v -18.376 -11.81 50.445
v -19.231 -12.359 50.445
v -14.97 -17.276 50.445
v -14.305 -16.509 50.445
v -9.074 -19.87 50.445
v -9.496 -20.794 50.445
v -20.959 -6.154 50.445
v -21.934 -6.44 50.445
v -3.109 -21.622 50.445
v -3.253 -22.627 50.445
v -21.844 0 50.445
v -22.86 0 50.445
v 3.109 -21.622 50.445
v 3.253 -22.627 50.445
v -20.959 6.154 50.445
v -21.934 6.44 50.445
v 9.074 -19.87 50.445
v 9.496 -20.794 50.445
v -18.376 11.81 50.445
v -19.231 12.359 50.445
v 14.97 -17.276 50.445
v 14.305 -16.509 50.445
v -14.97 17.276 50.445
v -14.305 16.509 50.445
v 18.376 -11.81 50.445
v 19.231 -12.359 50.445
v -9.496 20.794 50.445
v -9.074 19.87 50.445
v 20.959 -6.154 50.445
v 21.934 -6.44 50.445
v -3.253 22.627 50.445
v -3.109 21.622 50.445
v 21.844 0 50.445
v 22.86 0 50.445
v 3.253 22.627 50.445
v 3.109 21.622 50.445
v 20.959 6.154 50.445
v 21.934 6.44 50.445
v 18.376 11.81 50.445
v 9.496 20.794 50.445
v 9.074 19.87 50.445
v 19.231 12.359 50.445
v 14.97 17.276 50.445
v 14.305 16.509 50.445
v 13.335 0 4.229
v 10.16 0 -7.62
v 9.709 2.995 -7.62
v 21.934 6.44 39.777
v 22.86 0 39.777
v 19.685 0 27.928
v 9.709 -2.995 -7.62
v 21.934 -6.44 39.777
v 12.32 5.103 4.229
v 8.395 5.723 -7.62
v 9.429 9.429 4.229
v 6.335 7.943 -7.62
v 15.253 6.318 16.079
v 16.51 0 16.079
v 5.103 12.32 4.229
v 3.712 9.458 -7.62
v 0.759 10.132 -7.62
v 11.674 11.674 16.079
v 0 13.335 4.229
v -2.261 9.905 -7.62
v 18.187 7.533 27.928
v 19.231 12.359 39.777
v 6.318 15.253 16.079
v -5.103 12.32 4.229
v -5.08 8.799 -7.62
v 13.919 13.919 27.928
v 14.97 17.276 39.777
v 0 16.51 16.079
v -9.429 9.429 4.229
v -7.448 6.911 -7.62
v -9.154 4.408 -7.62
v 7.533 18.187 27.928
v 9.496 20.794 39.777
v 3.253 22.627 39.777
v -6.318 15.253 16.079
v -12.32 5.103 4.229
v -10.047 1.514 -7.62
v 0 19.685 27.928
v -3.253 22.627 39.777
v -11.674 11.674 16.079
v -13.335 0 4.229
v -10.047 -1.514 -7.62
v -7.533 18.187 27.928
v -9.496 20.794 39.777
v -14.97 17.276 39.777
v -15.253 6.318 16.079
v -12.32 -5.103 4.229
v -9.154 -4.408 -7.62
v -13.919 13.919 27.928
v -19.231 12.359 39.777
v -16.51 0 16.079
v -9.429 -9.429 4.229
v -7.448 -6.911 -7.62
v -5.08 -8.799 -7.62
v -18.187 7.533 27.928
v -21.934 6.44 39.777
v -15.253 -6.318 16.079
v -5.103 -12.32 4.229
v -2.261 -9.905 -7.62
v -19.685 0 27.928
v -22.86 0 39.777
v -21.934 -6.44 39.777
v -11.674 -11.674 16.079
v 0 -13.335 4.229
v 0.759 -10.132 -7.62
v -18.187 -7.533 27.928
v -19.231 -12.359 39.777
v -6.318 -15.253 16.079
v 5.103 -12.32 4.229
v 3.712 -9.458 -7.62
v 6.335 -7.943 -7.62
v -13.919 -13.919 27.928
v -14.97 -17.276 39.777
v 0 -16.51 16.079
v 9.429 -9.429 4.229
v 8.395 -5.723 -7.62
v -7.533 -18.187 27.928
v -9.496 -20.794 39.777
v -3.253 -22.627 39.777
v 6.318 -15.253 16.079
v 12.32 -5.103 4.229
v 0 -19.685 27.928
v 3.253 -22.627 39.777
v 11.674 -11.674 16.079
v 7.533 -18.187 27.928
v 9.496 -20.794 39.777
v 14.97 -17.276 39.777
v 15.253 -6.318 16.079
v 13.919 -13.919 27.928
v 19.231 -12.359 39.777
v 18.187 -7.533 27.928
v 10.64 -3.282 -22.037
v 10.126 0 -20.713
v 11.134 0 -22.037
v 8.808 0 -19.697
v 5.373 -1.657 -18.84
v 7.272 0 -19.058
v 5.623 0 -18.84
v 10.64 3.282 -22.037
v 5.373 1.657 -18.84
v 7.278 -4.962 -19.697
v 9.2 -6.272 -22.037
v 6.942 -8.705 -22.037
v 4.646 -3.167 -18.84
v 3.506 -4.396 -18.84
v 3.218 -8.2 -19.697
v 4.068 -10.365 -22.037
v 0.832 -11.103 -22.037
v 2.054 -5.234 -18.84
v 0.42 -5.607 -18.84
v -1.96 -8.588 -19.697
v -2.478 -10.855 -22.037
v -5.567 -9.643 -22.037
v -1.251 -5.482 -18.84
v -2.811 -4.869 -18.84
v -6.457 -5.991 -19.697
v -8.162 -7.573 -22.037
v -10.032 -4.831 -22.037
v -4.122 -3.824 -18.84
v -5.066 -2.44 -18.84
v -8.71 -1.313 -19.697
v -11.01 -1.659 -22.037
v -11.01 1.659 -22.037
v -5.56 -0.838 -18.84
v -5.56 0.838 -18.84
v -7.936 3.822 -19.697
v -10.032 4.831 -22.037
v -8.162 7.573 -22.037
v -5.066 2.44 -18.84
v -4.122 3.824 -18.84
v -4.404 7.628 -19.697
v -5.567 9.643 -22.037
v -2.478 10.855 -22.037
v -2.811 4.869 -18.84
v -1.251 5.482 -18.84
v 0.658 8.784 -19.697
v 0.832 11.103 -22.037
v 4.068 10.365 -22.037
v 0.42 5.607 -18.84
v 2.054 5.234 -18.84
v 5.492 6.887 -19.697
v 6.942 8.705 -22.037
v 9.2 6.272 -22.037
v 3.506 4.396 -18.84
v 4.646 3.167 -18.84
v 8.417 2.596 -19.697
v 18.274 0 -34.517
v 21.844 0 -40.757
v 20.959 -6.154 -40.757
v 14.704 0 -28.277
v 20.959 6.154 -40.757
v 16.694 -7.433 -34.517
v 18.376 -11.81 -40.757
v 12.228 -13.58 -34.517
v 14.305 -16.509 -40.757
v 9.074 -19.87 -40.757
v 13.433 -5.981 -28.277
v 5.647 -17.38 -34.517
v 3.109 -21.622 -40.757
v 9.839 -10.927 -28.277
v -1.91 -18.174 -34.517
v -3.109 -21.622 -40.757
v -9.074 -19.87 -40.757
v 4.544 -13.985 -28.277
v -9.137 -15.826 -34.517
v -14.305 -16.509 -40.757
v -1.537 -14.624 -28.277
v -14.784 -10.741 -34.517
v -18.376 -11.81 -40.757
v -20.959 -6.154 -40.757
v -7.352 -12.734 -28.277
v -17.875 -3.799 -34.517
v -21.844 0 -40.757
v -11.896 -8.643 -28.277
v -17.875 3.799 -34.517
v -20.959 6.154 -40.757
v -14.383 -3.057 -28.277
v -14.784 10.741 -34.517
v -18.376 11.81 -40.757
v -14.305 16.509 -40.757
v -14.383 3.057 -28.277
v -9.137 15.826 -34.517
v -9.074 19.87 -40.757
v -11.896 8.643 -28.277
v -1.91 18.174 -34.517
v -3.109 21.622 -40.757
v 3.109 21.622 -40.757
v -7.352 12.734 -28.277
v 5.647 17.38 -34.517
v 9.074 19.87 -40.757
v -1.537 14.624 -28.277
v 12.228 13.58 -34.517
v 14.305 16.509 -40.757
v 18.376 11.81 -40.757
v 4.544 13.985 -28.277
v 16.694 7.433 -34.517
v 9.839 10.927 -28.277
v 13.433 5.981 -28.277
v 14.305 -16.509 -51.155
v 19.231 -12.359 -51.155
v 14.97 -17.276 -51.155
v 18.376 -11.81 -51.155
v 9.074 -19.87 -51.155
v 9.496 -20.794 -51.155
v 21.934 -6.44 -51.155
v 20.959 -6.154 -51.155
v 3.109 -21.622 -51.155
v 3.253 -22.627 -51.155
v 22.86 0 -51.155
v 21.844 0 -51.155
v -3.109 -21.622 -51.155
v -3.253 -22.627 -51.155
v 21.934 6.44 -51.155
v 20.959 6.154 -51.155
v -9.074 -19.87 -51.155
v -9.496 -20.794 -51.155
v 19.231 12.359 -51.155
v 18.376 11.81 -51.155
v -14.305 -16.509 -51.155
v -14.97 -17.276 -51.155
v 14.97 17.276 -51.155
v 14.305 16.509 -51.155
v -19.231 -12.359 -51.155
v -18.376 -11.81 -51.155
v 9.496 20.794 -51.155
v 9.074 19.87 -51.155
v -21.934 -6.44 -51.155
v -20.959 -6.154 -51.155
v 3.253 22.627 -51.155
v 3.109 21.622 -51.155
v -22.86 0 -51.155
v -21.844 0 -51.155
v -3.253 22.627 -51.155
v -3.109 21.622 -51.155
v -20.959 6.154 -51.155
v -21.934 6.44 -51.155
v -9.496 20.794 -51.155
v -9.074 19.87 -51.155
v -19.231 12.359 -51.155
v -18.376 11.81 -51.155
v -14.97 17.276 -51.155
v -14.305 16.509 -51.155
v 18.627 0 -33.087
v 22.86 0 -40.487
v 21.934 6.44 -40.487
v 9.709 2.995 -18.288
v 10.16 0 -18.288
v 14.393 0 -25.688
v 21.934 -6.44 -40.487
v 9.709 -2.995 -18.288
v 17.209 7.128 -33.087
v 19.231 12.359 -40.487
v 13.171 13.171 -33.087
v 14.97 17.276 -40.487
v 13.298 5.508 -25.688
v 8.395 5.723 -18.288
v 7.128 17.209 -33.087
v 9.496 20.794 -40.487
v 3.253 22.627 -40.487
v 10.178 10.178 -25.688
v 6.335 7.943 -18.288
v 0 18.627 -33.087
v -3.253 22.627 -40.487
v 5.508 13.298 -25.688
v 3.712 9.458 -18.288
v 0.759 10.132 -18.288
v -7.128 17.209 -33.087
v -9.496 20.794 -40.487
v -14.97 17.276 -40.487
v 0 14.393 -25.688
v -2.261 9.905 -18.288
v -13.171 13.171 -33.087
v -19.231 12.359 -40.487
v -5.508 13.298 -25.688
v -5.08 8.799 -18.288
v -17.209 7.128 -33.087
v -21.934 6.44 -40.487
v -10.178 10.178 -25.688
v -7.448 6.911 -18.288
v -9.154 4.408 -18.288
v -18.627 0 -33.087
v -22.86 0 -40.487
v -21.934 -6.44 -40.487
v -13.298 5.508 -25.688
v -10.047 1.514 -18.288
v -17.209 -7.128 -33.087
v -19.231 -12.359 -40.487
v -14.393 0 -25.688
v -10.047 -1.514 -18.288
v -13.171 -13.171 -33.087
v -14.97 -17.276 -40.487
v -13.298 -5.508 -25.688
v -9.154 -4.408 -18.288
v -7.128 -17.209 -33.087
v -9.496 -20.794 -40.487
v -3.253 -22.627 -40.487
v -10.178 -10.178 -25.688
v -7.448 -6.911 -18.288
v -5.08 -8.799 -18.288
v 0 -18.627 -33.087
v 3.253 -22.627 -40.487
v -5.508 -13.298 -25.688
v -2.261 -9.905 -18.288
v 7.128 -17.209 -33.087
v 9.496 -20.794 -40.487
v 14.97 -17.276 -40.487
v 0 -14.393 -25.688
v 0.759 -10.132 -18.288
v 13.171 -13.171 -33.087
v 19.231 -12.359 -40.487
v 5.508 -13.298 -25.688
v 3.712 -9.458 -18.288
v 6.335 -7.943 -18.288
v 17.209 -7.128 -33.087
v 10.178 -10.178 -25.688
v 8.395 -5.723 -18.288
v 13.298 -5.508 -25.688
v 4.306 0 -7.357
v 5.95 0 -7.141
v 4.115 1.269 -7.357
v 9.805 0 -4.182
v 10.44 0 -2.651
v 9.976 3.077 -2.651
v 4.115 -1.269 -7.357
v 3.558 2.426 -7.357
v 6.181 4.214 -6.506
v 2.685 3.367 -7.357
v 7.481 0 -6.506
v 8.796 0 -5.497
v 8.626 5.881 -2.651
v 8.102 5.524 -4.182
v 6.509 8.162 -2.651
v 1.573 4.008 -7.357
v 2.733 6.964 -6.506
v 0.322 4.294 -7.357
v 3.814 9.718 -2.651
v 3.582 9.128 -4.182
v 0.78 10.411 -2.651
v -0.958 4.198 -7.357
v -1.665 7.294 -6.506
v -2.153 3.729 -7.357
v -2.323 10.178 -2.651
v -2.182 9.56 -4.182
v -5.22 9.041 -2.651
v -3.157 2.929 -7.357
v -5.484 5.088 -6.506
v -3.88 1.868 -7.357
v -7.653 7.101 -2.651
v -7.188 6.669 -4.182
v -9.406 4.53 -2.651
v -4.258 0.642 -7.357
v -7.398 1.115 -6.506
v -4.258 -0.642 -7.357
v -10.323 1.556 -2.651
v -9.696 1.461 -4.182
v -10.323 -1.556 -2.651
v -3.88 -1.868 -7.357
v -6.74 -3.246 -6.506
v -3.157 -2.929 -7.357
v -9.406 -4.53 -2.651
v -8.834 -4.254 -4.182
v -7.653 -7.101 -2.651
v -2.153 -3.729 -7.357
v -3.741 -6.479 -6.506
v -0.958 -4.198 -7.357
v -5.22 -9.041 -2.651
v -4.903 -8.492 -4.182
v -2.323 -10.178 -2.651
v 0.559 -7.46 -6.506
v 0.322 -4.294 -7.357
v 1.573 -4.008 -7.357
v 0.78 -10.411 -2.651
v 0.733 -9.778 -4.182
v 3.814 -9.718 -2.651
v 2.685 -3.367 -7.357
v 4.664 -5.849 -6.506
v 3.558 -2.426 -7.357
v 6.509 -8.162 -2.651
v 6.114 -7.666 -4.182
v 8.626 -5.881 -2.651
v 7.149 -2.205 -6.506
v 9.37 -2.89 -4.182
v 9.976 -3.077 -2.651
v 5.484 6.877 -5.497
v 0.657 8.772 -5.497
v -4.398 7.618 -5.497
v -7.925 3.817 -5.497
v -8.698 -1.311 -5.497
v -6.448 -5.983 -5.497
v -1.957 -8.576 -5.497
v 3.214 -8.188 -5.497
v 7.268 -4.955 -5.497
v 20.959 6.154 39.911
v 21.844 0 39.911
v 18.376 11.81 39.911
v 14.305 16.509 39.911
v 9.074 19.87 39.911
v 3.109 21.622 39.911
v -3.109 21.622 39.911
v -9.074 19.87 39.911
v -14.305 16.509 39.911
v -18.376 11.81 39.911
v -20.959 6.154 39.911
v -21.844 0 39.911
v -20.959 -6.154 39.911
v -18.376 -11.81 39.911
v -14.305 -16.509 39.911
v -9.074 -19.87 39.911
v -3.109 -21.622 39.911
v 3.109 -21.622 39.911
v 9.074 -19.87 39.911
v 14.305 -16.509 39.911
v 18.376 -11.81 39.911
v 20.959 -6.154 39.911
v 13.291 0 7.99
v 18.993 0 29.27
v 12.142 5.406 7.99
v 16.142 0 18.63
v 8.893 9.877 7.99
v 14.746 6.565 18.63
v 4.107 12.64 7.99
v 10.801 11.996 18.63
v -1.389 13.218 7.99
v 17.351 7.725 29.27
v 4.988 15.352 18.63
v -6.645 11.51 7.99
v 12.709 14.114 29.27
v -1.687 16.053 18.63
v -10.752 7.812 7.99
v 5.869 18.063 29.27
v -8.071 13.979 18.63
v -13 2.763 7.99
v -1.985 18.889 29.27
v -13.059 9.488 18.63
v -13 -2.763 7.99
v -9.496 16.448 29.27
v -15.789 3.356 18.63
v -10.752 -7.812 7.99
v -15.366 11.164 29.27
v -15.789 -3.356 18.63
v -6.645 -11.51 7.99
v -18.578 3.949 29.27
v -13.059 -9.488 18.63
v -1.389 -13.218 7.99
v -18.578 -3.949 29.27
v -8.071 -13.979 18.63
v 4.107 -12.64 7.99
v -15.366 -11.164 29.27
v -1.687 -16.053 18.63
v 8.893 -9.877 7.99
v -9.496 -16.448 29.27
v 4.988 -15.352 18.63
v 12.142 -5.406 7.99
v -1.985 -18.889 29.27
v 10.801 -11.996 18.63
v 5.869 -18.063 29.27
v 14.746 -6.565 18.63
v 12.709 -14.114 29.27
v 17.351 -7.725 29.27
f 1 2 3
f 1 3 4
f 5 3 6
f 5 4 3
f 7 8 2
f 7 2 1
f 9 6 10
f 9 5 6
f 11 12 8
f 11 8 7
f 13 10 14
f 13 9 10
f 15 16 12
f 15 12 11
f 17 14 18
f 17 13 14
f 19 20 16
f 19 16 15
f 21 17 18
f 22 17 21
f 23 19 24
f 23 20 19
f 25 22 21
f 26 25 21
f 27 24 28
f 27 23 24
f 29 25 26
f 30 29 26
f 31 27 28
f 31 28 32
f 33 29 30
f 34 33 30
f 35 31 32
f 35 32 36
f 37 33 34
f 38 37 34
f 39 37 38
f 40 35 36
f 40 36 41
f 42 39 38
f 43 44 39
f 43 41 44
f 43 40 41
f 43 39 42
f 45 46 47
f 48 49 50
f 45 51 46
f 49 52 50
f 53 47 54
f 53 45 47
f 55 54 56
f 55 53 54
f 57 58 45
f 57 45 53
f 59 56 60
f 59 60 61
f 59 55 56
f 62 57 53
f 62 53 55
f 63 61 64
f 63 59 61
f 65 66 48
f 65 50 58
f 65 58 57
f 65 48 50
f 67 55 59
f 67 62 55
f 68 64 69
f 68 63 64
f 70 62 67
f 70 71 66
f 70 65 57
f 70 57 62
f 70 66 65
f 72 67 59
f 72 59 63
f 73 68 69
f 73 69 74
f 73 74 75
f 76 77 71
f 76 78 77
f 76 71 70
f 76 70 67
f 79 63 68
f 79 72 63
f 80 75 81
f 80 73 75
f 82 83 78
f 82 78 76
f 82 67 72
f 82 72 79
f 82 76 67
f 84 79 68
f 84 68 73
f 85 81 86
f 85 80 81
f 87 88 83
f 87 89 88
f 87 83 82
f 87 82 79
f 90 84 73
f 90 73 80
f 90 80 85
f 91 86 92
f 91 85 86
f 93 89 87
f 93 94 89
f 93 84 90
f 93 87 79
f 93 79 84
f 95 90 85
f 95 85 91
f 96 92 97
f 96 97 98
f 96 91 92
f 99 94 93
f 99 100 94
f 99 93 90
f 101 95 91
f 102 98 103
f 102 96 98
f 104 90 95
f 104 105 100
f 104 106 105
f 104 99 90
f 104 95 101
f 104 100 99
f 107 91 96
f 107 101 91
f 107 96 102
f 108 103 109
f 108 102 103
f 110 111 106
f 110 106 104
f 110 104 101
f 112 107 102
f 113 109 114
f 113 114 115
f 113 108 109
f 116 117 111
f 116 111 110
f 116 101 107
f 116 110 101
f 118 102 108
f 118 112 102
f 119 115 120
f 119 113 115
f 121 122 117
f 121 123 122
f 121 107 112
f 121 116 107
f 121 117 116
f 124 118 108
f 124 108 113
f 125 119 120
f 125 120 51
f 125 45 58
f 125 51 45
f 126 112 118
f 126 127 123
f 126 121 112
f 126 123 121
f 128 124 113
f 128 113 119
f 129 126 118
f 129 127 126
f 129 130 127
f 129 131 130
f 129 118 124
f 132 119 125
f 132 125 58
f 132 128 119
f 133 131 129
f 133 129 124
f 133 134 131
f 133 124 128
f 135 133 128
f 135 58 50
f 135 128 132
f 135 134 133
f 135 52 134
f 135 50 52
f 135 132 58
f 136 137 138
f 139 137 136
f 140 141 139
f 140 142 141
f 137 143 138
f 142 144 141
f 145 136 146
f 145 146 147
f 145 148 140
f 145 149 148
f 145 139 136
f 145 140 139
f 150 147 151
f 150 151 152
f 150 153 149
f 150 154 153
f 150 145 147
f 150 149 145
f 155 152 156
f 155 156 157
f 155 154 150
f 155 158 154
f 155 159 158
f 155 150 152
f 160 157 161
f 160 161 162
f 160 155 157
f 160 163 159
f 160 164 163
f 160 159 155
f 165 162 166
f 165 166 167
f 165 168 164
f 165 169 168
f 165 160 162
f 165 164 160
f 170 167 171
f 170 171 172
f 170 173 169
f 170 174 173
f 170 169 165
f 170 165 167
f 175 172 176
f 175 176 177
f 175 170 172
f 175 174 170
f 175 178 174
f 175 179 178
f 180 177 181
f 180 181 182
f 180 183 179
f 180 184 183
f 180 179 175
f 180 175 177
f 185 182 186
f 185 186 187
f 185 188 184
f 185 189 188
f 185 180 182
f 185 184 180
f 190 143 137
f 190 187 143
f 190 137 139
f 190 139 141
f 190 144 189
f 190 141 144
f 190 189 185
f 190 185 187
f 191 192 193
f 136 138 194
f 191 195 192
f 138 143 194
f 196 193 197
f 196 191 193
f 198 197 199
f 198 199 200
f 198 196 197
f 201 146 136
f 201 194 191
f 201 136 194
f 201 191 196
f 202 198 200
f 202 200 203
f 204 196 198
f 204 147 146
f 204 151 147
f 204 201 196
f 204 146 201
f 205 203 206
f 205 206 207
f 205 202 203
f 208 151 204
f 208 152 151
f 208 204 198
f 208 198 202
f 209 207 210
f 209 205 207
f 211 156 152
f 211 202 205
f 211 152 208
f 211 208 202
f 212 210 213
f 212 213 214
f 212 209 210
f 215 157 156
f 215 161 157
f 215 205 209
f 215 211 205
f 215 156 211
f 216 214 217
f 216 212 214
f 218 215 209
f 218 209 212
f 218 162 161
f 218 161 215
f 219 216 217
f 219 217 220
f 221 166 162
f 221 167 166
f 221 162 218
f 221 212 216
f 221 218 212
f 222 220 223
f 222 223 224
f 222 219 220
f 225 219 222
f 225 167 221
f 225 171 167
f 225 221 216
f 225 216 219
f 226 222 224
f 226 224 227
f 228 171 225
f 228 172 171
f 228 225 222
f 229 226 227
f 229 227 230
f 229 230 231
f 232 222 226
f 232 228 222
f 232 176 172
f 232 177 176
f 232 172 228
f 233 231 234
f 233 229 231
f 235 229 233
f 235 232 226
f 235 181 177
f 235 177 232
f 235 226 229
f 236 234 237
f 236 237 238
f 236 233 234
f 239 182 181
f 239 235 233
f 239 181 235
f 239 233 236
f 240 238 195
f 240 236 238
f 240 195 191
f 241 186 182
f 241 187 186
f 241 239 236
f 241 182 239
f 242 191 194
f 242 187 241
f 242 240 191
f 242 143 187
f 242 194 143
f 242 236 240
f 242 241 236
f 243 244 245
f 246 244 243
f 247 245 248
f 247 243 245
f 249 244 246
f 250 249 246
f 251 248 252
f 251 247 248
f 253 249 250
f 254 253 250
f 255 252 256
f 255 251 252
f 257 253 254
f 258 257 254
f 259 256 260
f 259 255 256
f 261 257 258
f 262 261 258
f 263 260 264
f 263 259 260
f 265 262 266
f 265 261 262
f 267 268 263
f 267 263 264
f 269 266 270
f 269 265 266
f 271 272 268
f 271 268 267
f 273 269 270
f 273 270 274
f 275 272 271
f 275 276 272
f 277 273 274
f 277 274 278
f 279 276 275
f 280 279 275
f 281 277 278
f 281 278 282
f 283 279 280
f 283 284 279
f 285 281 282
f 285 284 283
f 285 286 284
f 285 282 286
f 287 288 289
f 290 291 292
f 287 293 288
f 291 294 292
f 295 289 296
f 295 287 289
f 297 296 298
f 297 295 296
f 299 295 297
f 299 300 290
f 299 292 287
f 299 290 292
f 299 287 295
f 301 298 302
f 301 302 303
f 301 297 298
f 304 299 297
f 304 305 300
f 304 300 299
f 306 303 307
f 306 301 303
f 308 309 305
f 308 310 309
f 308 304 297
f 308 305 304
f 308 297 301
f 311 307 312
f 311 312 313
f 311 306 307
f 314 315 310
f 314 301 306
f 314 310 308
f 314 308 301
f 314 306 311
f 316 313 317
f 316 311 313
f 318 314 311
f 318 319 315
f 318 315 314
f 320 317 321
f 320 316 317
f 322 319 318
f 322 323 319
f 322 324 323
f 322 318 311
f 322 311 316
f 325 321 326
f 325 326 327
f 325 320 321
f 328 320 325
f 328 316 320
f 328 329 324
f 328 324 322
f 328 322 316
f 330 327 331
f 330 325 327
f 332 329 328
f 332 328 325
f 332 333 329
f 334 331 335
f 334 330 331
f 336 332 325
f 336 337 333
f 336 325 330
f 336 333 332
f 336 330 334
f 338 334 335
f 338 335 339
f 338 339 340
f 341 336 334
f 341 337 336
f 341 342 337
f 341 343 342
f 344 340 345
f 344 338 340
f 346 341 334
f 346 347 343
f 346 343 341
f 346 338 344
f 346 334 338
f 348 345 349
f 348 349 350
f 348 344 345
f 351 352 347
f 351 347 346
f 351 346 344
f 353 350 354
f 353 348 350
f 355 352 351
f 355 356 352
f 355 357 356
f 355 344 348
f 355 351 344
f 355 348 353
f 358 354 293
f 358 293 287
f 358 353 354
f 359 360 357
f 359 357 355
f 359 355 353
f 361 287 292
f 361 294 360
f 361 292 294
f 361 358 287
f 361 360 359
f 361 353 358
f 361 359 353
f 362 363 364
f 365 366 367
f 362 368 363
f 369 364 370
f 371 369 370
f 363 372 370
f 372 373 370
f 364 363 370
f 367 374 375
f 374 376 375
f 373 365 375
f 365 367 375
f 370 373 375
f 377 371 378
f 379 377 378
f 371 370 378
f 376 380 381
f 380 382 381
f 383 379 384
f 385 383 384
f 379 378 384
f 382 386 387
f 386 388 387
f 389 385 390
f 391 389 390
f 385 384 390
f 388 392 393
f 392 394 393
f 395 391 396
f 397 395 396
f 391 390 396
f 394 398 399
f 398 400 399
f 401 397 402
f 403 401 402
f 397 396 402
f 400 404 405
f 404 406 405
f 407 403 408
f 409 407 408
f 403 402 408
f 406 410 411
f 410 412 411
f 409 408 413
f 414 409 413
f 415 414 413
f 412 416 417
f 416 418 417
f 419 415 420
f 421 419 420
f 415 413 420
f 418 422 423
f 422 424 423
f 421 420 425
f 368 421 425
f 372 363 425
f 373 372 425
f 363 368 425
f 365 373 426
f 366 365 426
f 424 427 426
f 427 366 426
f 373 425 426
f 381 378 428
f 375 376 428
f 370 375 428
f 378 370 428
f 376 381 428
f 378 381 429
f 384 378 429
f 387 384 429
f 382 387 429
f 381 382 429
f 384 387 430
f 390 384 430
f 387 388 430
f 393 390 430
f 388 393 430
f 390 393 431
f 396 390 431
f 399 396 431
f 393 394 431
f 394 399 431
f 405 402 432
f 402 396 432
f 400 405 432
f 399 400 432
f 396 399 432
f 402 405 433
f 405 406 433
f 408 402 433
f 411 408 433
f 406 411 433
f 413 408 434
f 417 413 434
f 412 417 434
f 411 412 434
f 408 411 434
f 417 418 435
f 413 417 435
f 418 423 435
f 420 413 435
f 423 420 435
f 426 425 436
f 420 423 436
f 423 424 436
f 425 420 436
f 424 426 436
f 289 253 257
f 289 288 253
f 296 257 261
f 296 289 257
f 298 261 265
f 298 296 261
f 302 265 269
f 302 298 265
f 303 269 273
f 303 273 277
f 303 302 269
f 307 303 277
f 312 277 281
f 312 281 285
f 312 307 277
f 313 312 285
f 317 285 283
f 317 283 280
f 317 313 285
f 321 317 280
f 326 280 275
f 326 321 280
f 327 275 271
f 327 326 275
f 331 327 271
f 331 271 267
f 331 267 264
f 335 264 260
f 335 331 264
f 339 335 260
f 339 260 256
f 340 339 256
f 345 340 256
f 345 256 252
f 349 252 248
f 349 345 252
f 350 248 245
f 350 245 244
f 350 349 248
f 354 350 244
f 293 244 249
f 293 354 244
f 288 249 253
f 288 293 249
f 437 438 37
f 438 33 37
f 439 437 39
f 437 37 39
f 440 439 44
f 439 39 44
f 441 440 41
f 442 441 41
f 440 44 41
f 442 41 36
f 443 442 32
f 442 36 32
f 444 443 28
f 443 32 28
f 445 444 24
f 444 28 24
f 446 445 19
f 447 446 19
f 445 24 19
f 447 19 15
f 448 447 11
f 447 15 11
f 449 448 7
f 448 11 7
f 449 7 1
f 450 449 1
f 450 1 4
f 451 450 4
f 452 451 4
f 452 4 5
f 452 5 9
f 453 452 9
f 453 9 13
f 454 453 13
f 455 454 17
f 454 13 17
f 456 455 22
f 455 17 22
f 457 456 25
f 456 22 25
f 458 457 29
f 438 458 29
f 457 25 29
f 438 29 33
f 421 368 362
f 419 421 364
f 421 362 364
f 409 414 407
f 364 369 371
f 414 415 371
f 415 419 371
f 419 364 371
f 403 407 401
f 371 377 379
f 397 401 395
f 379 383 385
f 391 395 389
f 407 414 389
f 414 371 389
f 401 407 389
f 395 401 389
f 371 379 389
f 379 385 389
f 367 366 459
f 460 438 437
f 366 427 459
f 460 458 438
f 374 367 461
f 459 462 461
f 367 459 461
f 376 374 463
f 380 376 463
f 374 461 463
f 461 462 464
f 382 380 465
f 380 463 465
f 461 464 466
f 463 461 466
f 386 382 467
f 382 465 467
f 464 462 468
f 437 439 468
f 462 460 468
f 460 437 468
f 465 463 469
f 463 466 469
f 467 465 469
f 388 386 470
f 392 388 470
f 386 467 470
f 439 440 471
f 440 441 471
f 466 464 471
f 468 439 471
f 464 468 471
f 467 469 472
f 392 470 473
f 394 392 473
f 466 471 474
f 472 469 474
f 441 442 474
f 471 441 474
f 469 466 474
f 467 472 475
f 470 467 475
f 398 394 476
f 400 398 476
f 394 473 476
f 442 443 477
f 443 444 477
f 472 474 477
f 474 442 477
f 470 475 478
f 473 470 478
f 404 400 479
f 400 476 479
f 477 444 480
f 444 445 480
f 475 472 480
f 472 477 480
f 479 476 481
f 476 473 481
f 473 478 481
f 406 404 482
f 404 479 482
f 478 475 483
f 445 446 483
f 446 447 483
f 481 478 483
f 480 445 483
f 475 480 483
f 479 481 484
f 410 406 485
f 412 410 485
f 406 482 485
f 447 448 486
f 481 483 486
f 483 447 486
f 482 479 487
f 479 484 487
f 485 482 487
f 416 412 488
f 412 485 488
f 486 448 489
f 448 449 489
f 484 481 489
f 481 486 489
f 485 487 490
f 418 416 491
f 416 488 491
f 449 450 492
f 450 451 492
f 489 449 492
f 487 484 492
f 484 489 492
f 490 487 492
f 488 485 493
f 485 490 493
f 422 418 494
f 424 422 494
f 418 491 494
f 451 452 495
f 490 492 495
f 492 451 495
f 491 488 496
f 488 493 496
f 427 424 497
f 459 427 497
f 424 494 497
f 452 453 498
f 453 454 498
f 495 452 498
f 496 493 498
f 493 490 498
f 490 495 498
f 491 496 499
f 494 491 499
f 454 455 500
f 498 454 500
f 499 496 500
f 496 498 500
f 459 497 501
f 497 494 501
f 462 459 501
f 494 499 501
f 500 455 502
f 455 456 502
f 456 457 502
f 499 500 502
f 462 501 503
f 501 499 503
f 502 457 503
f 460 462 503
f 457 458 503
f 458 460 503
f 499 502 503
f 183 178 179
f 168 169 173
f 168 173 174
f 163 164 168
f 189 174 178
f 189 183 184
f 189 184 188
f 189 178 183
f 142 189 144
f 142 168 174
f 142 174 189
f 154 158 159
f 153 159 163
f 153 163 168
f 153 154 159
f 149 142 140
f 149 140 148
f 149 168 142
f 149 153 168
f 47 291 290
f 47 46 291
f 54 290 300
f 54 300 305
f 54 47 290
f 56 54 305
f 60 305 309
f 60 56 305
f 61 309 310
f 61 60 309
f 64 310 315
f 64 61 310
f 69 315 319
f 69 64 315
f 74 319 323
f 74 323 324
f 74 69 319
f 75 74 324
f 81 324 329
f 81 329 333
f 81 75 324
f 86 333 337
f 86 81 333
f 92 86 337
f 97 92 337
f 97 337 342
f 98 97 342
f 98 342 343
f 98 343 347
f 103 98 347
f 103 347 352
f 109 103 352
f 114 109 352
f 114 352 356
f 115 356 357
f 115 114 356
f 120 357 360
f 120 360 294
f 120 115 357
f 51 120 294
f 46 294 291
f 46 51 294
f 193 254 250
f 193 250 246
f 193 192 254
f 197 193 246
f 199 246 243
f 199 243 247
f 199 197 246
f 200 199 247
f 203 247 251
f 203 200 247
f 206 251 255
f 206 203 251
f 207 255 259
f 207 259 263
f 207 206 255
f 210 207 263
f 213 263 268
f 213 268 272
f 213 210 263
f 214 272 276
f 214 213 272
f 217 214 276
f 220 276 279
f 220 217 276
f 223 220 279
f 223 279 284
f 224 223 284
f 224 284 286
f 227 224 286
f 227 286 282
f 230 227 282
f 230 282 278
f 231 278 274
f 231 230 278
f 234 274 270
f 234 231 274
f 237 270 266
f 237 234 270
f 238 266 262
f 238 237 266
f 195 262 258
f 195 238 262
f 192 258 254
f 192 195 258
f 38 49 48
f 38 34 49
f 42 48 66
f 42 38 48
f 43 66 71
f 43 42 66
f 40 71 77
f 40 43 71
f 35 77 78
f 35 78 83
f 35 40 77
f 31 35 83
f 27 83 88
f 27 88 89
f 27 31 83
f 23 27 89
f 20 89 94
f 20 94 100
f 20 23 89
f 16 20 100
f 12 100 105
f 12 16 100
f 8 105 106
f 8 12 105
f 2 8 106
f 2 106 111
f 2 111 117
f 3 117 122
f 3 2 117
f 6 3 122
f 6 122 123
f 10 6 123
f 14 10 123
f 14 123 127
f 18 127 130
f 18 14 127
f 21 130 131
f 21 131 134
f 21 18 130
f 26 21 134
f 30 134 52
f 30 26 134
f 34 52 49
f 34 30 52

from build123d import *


with BuildPart() as f1:
    # F0 (on Front) → F1 (revolve)
    with BuildSketch(Plane.XZ):
        Polygon((22.86, 39.777045), (22.86, 50.445045), (0, 50.445045), (0, -51.154955), (22.86, -51.154955), (22.86, -40.486955), (10.16, -18.288), (10.16, -7.62), align=None)
    revolve(axis=Axis((0, 0, -0.354955), (0, 0, 1)))

    # F2 (on Front) → F3 (revolve, cut)
    with BuildSketch(Plane.XZ):
        with BuildLine():
            Line((10.439722, -2.650541), (21.844, 39.910804))
            Line((21.844, 39.910804), (21.844, 50.445045))
            Line((21.844, 50.445045), (0, 50.445045))
            Line((0, 50.445045), (0, -7.35704))
            Line((0, -7.35704), (4.306093, -7.35704))
            ThreePointArc((4.306093, -7.35704), (8.171728, -6.044834), (10.439722, -2.650541))
        make_face()
    revolve(axis=Axis((0, 0, 21.544003), (0, 0, 1)), mode=Mode.SUBTRACT)

    # F4 (on Front) → F5 (revolve, cut)
    with BuildSketch(Plane.XZ):
        with BuildLine():
            Line((21.844, -40.757043), (11.134297, -22.037026))
            ThreePointArc((11.134297, -22.037026), (8.808393, -19.697309), (5.622545, -18.840293))
            Line((5.622545, -18.840293), (0, -18.840293))
            Line((0, -18.840293), (0, -51.154955))
            Line((0, -51.154955), (21.844, -51.154955))
            Line((21.844, -51.154955), (21.844, -40.757043))
        make_face()
    revolve(axis=Axis((0, 0, -34.997624), (0, 0, -1)), mode=Mode.SUBTRACT)


solid = f1.part
